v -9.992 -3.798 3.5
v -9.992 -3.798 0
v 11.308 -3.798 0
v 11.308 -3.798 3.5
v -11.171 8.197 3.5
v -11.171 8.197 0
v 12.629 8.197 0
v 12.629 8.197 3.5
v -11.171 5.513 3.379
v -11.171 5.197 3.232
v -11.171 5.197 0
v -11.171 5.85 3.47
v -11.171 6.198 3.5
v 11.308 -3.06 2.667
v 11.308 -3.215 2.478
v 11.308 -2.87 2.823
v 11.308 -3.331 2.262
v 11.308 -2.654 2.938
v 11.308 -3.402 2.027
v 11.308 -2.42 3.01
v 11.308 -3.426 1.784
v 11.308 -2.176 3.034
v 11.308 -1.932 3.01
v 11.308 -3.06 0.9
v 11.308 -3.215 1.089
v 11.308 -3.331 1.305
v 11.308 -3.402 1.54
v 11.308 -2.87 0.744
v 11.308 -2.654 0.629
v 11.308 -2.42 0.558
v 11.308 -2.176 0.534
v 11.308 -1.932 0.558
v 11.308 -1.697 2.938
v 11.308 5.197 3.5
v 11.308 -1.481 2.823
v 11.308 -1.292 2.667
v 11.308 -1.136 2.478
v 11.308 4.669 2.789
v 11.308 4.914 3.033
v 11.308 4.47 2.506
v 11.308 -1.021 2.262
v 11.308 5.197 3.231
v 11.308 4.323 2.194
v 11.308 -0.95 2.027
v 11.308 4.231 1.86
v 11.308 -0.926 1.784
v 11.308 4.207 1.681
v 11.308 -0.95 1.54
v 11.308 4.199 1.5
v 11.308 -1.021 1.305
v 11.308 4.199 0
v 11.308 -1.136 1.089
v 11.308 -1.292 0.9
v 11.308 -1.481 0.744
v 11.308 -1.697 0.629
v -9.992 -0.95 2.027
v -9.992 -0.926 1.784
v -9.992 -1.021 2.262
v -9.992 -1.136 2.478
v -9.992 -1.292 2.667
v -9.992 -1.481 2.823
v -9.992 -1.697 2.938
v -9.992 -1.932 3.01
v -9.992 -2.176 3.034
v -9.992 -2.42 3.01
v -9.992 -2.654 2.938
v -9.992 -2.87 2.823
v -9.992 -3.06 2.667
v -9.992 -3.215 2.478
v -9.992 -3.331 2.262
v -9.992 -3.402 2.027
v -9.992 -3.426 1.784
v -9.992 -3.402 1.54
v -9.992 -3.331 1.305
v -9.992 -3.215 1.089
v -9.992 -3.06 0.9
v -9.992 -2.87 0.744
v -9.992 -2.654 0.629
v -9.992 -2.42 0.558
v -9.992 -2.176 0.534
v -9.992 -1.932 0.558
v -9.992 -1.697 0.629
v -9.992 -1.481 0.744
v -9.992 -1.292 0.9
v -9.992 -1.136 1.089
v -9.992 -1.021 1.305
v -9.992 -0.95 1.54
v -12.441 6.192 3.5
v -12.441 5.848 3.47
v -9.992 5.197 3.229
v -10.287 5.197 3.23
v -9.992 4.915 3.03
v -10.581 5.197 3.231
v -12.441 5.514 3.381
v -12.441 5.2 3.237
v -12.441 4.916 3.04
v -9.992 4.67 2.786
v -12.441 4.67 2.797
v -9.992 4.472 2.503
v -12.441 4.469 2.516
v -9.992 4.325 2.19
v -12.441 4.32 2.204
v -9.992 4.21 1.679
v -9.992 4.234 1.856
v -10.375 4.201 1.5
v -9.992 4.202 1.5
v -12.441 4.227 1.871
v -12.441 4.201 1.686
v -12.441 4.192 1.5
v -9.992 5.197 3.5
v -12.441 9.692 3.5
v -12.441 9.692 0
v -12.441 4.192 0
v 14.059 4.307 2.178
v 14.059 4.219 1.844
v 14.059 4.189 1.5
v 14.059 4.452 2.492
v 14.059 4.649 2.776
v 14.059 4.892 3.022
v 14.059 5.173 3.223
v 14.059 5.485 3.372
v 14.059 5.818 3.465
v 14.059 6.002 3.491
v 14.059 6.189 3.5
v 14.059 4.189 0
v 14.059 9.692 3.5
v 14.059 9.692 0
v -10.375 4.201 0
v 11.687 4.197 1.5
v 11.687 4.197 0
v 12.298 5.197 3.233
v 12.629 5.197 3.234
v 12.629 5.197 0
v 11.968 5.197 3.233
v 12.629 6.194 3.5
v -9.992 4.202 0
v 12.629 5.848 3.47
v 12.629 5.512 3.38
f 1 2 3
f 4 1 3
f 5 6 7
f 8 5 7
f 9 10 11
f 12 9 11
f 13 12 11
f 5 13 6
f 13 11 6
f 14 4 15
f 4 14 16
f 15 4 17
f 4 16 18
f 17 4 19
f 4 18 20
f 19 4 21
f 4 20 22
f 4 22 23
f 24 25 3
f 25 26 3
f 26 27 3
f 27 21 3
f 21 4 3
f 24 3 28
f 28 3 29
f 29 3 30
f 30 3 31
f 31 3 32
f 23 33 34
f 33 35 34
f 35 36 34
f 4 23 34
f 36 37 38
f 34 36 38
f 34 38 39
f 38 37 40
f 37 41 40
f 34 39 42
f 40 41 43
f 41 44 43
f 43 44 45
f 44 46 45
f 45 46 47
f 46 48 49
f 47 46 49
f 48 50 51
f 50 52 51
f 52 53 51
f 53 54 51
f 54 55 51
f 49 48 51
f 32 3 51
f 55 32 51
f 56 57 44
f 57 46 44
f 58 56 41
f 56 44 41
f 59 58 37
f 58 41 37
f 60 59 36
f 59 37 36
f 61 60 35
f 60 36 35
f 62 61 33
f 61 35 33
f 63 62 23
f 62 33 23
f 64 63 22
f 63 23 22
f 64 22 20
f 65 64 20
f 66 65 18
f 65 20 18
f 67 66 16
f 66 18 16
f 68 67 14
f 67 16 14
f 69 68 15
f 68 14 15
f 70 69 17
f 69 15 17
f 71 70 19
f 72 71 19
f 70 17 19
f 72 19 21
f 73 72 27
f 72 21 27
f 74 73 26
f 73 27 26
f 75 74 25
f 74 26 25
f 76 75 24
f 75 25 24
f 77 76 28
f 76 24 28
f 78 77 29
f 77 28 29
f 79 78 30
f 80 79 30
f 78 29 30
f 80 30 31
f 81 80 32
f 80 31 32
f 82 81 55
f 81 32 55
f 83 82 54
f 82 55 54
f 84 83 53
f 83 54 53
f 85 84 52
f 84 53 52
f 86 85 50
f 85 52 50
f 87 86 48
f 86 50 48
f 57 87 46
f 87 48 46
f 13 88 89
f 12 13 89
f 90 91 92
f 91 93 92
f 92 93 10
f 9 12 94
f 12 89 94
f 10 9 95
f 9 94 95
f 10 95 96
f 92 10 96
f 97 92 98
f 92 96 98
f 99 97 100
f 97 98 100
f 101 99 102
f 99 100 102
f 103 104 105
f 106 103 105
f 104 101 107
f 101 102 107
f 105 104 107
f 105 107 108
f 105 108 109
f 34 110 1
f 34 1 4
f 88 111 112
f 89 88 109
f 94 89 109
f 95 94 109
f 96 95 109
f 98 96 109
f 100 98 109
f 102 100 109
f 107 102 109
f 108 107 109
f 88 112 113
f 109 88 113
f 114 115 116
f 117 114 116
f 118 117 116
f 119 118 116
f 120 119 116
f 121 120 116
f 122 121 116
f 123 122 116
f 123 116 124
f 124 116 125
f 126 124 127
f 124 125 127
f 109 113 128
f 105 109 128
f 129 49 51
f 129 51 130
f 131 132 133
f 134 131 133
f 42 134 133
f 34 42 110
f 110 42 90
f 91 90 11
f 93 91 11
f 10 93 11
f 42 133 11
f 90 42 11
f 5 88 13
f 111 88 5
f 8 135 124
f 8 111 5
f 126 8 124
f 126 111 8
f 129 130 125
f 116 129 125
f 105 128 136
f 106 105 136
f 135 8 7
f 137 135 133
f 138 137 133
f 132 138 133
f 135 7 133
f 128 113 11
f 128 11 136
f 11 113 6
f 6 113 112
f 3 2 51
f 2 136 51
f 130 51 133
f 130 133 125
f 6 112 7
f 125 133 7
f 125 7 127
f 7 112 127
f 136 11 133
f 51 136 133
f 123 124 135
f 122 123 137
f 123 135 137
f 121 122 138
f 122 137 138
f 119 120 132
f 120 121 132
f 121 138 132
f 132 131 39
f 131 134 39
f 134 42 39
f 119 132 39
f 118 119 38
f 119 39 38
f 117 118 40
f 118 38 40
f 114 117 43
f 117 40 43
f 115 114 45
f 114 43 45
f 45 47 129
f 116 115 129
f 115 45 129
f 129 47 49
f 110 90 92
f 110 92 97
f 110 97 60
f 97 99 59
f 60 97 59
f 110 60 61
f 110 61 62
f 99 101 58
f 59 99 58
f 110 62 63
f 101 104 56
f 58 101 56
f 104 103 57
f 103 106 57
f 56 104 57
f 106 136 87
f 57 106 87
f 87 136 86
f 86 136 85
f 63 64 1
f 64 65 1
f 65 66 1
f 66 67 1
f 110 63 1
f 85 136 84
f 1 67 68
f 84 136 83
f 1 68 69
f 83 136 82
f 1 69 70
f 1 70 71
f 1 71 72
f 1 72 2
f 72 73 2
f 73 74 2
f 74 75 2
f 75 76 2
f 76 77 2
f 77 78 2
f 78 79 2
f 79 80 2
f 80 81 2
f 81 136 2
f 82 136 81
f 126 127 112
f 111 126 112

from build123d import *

# Parameters (mm, degrees)
F1_DEPTH      = 3.5
F2_R          = 1.25
F3_DEPTH      = 25
F3_DEPTH_BACK = 25
F4_T4_DEPTH   = 12.7513736877
F4_T9_DEPTH   = 12.4486649129


# Not quite as in the source:
# - a fillet or chamfer that OpenCascade refuses, or shapes differently, is made with other operations: its cross-section is extruded or revolved along the edge and cut away or added


with BuildPart() as f1:
    # F0 (on Top) → F1 (new body)
    with BuildSketch(Plane.XY):
        Polygon((-9.9924615563, -3.7976490931), (11.3075384437, -3.7976490931), (11.3075384437, 4.1987212708), (11.6869780256, 4.1973420195), (11.6869780256, 5.1973420195), (-10.3793237358, 5.1973420195), (-10.3752534696, 4.2007874551), (-9.9924615563, 4.2023509069), align=None)
        Polygon((11.6869780256, 5.1973420195), (11.6869780256, 4.1973420195), (14.0588939546, 4.1887201777), (14.0588939546, 9.6923498138), (-12.4411060454, 9.6923498138), (-12.4411060454, 4.1923498138), (-10.3752534696, 4.2007874551), (-10.3793237358, 5.1973420195), (-11.1709162593, 5.1973420195), (-11.1709162593, 8.1973420195), (12.6290837407, 8.1973420195), (12.6290837407, 5.1973420195), align=None)
    extrude(amount=F1_DEPTH)

    # F2 (on Right) → F3 (cut, two sides)
    with BuildSketch(Plane.YZ) as f3_sk:
        with Locations((-2.1757856011, 1.7836129991)):
            Circle(F2_R)
    extrude(amount=-F3_DEPTH, mode=Mode.SUBTRACT)
    extrude(f3_sk.sketch, amount=F3_DEPTH_BACK, mode=Mode.SUBTRACT)

    # F4: fillet of radius 2 on 2 edges, made by hand


with BuildPart() as f4_tool2:
    # F4_s3 → F4_t4 (new body)
    with BuildSketch(Plane(origin=(6.2921600495, -0.0228718094, 0), x_dir=(0, 0, 1), z_dir=(0.9999933936, -0.0036349454, 0))):
        with BuildLine():
            ThreePointArc((3.5, -6.2397958172), (2.9142135624, -4.8255822548), (1.5, -4.2397958172))
            Line((1.5, -4.2397958172), (3.5, -4.2397958172))
            Line((3.5, -4.2397958172), (3.5, -6.2397958172))
        make_face()
    extrude(amount=F4_T4_DEPTH)

    split(bisect_by=Plane.YZ.offset(11.3075384437), keep=Keep.TOP)


with BuildPart() as f1_1:
    add(f1.part)

    # F4_t1: cut F4_tool2
    add(f4_tool2.part, mode=Mode.SUBTRACT)


with BuildPart() as f4_tool7:
    # F4_s8 → F4_t9 (new body)
    with BuildSketch(Plane(origin=(-17.423734114, -0.0711644294, 0), x_dir=(0, 0, 1), z_dir=(0.9999916592, 0.0040843045, 0))):
        with BuildLine():
            ThreePointArc((3.5, -6.2431281117), (2.9142135624, -4.8289145493), (1.5, -4.2431281117))
            Line((1.5, -4.2431281117), (3.5, -4.2431281117))
            Line((3.5, -4.2431281117), (3.5, -6.2431281117))
        make_face()
    extrude(amount=F4_T9_DEPTH)

    split(bisect_by=Plane.YZ.offset(-9.9924615563), keep=Keep.BOTTOM)


with BuildPart() as f1_2:
    add(f1_1.part)

    # F4_t6: cut F4_tool7
    add(f4_tool7.part, mode=Mode.SUBTRACT)


solid = f1_2.part
